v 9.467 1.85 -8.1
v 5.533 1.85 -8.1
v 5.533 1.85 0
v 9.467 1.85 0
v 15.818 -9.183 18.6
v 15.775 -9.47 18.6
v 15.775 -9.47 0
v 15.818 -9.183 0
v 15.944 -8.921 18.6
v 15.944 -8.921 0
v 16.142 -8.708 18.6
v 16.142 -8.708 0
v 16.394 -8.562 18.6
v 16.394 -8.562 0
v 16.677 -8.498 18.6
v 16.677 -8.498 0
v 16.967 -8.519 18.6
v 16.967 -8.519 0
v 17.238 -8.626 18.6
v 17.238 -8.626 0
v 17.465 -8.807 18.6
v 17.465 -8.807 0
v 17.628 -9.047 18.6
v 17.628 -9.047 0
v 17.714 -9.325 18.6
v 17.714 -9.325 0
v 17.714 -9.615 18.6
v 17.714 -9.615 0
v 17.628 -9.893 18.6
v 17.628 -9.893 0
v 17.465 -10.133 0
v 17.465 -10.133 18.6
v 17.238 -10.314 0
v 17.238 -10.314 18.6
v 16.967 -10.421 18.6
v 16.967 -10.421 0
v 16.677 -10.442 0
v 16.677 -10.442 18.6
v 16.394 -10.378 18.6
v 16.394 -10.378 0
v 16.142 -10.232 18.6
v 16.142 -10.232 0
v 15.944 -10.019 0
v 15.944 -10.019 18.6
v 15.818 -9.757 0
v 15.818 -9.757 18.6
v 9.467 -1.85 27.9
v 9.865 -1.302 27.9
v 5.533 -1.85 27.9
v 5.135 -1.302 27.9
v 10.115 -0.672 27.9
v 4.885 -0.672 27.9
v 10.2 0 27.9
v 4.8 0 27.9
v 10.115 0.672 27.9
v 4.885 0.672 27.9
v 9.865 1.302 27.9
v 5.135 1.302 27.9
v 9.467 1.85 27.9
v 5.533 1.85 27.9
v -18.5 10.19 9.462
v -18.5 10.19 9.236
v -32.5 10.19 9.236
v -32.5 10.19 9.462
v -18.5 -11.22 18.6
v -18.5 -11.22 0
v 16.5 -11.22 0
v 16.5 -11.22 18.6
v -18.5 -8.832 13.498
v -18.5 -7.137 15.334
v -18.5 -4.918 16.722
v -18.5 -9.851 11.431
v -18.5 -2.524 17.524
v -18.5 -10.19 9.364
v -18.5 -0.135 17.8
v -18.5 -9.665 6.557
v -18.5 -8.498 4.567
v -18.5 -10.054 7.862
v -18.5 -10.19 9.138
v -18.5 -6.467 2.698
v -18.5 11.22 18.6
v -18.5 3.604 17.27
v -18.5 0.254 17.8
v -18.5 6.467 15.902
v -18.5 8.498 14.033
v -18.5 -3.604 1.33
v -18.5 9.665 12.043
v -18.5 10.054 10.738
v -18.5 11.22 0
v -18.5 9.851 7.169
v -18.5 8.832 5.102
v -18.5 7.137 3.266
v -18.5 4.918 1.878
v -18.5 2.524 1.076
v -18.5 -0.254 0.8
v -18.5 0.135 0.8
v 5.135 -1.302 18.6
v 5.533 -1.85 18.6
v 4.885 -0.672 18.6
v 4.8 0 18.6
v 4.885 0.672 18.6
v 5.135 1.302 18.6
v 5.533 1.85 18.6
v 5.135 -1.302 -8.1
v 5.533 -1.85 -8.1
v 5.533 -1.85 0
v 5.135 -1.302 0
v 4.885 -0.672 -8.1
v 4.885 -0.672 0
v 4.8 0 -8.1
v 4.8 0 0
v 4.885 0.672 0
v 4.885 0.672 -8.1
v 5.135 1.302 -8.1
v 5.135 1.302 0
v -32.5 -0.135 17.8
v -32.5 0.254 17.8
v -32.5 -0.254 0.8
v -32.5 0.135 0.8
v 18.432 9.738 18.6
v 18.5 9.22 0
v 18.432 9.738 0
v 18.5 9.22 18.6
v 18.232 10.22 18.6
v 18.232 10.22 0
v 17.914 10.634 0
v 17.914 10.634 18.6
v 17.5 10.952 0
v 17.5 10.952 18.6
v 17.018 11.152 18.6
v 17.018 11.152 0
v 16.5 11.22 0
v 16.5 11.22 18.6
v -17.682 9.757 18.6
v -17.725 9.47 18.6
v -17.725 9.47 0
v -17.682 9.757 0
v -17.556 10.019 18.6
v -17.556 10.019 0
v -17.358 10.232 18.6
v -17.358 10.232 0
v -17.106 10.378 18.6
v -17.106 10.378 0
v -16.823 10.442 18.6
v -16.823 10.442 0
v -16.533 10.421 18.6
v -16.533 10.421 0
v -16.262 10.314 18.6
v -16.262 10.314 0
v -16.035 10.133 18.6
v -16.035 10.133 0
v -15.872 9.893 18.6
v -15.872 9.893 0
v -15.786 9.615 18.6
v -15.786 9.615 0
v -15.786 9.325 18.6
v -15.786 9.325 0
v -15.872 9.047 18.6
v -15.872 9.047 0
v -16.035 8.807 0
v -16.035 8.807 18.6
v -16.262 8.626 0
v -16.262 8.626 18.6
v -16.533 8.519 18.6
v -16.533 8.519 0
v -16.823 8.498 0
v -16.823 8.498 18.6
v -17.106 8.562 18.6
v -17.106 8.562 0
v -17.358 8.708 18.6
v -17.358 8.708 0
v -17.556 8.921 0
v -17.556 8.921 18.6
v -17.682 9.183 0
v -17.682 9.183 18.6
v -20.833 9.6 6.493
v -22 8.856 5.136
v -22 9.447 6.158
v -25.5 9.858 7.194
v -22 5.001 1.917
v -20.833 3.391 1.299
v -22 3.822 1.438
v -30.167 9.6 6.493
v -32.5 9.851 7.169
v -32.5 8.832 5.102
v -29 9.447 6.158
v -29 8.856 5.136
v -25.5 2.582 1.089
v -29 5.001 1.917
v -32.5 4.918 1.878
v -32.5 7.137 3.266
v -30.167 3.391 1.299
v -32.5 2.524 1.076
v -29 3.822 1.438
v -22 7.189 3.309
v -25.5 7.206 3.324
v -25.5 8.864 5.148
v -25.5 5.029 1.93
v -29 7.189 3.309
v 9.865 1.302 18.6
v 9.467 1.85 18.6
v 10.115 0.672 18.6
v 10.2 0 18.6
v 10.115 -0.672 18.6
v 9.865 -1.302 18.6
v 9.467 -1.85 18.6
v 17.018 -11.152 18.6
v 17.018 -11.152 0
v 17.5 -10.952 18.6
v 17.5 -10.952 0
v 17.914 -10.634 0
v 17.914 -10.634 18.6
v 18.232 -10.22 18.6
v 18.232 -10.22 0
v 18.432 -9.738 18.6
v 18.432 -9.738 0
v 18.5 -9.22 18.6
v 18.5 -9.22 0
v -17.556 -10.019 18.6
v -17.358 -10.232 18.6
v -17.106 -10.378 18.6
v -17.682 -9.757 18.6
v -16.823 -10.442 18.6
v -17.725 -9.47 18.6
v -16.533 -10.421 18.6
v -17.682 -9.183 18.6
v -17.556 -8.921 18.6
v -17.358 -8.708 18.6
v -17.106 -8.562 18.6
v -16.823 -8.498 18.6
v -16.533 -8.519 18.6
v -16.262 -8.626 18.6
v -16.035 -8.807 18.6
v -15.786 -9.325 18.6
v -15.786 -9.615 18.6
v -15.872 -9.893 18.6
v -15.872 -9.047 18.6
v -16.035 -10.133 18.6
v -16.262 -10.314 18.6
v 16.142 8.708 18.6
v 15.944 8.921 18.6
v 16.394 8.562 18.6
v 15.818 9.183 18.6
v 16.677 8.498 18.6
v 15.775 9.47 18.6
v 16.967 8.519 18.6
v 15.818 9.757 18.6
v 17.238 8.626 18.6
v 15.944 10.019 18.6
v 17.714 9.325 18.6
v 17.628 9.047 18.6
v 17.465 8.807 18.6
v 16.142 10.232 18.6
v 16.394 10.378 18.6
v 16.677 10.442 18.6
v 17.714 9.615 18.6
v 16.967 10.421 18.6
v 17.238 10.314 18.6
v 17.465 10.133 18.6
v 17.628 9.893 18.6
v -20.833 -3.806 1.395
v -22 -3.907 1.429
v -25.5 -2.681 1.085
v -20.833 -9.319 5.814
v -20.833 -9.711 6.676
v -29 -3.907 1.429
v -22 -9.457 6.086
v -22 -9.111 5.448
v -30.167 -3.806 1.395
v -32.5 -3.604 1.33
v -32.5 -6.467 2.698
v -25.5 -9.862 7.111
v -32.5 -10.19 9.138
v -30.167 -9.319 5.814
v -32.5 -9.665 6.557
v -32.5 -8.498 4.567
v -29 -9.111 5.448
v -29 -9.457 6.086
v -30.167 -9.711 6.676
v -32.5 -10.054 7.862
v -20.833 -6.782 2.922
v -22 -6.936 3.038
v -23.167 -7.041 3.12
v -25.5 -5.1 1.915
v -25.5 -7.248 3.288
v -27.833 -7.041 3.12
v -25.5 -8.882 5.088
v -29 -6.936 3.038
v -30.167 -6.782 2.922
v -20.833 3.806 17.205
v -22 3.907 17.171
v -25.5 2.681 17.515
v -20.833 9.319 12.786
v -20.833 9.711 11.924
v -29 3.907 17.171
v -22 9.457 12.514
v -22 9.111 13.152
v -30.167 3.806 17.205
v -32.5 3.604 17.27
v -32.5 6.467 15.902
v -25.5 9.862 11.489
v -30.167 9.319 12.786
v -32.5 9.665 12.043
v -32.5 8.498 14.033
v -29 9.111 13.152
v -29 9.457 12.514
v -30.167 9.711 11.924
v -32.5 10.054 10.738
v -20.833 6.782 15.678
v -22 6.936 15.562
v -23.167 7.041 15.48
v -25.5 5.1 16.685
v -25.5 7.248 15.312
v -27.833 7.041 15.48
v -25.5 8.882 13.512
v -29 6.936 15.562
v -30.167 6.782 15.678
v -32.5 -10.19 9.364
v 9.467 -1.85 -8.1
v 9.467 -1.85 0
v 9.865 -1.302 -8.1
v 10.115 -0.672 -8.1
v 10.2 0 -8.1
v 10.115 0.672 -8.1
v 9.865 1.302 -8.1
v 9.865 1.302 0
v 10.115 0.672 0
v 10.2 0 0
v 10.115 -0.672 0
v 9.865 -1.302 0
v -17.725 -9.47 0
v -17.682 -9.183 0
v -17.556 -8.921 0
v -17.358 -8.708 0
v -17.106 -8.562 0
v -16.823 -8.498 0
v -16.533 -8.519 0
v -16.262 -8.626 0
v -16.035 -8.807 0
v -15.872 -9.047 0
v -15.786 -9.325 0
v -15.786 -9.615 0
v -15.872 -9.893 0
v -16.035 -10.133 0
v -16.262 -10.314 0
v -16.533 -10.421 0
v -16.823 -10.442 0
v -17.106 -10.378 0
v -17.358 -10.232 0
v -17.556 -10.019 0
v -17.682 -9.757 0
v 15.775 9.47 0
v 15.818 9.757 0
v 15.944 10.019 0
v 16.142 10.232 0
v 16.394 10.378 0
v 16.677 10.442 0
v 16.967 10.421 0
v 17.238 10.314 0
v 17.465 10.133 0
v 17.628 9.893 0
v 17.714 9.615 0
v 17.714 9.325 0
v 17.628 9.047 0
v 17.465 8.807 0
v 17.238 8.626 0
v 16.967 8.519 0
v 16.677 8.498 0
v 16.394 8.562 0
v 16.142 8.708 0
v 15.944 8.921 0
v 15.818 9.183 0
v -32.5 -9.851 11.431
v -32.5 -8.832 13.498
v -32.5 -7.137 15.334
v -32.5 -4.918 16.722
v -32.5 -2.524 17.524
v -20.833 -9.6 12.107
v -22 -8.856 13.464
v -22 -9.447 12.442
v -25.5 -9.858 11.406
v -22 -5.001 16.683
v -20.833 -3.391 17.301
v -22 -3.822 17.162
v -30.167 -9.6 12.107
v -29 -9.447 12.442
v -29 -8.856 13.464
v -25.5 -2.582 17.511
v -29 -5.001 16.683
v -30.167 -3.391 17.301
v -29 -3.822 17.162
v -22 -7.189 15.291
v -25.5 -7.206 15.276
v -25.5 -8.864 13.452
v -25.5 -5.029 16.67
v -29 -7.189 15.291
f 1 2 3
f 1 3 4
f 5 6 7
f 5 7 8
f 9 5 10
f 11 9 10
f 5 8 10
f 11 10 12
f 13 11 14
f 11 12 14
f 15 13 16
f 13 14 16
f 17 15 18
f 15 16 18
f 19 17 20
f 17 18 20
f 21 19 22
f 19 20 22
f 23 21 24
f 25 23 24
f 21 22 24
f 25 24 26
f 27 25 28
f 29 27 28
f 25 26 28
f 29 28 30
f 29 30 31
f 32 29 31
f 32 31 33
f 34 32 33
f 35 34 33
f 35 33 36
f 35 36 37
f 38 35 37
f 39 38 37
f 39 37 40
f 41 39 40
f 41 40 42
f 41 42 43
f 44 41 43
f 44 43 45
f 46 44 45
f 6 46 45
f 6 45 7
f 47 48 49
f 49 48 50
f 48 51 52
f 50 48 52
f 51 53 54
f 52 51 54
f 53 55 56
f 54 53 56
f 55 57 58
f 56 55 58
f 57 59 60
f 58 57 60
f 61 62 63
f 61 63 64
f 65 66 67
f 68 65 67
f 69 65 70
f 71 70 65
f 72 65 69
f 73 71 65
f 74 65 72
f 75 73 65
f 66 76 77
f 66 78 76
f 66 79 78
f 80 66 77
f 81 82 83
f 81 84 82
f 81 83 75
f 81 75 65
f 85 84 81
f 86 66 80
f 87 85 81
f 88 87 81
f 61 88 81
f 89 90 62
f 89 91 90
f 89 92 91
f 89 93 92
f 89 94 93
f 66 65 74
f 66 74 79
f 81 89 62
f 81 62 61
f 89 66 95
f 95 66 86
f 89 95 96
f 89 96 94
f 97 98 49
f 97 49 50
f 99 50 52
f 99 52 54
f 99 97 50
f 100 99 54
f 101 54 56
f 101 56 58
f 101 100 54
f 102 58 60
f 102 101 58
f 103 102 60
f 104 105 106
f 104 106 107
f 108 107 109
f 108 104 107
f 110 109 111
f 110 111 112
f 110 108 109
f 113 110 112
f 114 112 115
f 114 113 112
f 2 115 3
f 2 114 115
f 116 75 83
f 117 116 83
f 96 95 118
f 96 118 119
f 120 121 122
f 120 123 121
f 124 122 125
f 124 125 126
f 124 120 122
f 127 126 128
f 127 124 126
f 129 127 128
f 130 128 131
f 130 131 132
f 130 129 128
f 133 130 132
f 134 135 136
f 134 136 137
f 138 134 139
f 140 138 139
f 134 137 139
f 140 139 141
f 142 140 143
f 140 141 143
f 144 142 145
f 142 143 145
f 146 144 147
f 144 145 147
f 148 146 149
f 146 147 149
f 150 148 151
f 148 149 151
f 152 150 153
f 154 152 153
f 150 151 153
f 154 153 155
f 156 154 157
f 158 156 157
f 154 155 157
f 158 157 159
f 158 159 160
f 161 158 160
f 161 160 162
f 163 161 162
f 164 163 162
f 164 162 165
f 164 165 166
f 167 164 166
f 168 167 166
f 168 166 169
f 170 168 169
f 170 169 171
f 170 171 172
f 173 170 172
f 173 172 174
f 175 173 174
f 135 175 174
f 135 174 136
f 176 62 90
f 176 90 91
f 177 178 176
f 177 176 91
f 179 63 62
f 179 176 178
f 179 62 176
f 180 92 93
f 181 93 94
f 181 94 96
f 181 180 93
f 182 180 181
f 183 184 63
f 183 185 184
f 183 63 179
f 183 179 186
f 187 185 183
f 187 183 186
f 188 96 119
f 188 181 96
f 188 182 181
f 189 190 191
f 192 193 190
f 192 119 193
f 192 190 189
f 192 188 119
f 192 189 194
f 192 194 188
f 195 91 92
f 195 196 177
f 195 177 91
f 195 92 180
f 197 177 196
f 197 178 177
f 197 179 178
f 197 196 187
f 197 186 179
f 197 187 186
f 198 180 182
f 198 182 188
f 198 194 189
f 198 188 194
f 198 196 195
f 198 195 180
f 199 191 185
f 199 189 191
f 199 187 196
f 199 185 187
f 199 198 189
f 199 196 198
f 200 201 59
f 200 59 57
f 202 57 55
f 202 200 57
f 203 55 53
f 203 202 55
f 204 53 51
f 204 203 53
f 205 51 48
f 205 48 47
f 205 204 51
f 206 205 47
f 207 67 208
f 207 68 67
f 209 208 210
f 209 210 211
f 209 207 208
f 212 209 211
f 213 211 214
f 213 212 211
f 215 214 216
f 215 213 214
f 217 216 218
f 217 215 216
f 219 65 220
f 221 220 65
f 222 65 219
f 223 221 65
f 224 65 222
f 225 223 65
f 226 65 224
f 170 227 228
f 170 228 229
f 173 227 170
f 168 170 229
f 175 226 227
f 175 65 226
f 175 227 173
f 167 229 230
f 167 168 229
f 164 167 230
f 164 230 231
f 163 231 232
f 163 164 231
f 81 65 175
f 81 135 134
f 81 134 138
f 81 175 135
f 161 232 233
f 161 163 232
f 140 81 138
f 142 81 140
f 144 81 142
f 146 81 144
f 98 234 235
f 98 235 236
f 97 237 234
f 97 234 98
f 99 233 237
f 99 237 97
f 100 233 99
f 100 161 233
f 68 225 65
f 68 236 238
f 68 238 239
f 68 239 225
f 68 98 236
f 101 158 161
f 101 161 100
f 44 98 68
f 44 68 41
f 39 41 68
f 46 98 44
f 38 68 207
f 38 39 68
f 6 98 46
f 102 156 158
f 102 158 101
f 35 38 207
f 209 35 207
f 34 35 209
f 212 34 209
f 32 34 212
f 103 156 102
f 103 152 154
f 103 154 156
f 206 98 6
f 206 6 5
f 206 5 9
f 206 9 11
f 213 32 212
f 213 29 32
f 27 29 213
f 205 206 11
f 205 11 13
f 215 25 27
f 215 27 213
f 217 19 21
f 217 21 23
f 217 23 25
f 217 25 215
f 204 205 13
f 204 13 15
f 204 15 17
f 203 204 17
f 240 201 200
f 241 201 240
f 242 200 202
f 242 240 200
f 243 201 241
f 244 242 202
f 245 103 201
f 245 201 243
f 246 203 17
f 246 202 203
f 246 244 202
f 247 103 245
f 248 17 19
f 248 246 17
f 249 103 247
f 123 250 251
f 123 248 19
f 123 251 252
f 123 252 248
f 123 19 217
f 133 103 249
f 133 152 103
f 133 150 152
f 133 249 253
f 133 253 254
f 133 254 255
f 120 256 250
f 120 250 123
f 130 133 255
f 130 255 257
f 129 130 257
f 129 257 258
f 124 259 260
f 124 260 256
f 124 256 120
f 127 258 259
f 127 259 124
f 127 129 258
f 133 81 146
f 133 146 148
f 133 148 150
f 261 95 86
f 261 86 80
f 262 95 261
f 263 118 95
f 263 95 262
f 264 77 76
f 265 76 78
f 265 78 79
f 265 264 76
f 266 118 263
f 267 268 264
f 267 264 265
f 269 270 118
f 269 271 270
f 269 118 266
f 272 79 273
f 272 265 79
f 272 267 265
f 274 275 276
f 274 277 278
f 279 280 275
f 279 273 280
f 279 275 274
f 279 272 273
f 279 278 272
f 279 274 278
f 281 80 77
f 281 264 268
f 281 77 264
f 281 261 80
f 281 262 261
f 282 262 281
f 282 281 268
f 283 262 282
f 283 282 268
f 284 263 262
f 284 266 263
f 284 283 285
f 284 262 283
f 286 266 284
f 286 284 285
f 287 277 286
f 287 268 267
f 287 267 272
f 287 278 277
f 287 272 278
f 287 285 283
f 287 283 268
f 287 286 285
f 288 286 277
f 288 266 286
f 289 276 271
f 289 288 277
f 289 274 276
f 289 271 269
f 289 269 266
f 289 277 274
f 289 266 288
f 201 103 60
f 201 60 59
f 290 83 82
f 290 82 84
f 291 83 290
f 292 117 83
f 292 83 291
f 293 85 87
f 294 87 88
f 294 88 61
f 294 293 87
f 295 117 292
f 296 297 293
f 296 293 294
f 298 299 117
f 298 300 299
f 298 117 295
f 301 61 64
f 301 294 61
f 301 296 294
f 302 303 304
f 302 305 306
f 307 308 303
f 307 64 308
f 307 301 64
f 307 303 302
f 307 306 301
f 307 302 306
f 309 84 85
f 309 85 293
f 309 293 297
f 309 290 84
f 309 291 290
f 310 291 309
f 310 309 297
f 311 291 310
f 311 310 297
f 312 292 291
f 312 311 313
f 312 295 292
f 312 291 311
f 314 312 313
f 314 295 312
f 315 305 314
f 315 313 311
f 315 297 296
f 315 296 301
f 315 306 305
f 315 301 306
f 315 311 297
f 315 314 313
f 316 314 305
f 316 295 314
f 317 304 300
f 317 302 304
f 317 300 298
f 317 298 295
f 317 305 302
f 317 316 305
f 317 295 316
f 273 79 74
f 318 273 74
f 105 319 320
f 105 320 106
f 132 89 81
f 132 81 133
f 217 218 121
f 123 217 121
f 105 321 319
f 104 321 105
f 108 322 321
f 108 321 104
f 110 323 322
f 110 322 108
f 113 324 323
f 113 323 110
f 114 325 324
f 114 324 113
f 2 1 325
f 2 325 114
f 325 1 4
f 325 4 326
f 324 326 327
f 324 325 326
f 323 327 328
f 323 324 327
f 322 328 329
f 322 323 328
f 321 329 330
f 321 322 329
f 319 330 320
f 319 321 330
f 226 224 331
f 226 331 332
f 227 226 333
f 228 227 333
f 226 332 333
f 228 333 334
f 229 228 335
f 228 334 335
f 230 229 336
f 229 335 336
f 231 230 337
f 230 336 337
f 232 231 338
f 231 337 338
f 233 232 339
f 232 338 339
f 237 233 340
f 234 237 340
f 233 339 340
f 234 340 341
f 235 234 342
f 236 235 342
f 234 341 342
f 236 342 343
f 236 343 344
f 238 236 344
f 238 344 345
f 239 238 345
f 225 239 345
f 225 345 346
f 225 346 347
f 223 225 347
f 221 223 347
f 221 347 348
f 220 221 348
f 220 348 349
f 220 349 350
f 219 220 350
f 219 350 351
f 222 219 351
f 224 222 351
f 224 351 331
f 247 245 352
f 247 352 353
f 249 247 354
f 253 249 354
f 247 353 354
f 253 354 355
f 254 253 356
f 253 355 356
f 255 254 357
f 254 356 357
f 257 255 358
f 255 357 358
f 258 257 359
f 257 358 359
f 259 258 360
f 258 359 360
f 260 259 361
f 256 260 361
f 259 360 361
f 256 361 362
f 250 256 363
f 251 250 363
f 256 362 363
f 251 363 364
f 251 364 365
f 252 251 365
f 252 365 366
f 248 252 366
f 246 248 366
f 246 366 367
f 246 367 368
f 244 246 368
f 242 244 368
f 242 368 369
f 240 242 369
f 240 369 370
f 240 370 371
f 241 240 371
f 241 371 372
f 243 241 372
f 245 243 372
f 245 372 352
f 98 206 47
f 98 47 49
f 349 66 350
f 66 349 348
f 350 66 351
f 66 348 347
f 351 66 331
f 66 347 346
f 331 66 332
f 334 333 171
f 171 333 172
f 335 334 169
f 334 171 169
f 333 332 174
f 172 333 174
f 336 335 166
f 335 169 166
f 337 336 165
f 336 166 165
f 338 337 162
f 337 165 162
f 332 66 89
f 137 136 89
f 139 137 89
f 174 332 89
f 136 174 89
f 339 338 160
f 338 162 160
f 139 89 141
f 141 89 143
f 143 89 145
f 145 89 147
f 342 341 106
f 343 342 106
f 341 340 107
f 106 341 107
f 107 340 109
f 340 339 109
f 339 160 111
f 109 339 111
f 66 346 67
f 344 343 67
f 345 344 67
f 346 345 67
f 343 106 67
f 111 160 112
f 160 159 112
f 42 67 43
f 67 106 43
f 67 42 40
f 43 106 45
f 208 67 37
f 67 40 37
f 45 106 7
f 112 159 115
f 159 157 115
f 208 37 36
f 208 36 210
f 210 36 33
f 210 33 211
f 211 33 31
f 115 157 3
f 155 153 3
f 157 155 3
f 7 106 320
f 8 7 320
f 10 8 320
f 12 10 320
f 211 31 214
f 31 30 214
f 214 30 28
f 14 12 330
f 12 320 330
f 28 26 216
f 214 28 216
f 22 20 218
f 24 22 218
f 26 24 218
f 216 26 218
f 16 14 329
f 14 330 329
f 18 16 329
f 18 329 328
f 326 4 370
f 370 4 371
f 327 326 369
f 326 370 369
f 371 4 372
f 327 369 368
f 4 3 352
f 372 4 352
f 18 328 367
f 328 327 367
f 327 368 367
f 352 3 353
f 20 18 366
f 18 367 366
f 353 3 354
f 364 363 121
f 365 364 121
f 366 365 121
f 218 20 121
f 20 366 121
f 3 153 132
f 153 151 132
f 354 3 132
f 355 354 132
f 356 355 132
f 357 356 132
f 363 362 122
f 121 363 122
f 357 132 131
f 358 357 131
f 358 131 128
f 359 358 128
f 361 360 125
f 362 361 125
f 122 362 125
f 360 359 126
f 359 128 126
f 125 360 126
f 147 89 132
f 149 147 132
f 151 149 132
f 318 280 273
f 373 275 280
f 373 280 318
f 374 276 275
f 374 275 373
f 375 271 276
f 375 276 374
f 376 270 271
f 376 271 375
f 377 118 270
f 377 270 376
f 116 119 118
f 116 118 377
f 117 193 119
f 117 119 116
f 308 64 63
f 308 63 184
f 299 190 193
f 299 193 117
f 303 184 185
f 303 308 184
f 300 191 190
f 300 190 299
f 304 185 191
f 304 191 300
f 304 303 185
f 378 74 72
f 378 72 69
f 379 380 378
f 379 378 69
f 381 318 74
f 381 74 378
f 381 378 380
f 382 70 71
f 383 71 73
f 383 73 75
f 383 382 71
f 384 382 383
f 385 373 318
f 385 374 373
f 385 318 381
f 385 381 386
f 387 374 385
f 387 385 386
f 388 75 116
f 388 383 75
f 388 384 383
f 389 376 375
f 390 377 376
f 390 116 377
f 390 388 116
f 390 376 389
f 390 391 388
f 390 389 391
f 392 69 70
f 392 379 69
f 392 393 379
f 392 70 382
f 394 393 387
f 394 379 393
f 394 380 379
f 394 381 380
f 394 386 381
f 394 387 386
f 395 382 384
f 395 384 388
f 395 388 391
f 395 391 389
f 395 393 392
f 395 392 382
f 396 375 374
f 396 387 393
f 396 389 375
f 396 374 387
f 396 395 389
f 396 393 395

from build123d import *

# Parameters (mm, degrees)
SKETCH1_W                = 37
SKETCH1_H                = 22.44
BOSS_EXTRUDE1_DEPTH      = 18.6
FILLET1_R                = 2
SKETCH2_W                = 17
SKETCH2_H                = 20.38
BOSS_EXTRUDE2_DEPTH      = 14
BOSS_EXTRUDE3_DEPTH      = 9.3
BOSS_EXTRUDE3_DEPTH_BACK = 26.7
CUT_EXTRUDE1_DEPTH       = 14
SKETCH5_R                = 0.975
CUT_EXTRUDE2_DEPTH       = 45.278080455


with BuildPart() as part:
    # Sketch1 → Boss-Extrude1 (new body)
    with BuildSketch(Plane.XY):
        Rectangle(SKETCH1_W, SKETCH1_H)
    extrude(amount=BOSS_EXTRUDE1_DEPTH)

    # Fillet1
    fillet1_edges = [part.edges().sort_by_distance(p)[0] for p in [
        (18.5, 11.22, 9.3),
        (18.5, -11.22, 9.3),
    ]]
    fillet(fillet1_edges, radius=FILLET1_R)

    # Sketch2 → Boss-Extrude2 (add)
    with BuildSketch(Plane.ZY.offset(18.5)):
        with Locations((9.3, 0)):
            Rectangle(SKETCH2_W, SKETCH2_H)
    extrude(amount=BOSS_EXTRUDE2_DEPTH)

    # Sketch3 → Boss-Extrude3 (add, two sides: drawn at the far end of the back side and taken through both)
    with BuildSketch(Plane.XY.offset(18.6).offset(-BOSS_EXTRUDE3_DEPTH_BACK)):
        with BuildLine():
            Line((5.533403956, 1.85), (9.466596044, 1.85))
            ThreePointArc((9.466596044, 1.85), (10.2, 0), (9.466596044, -1.85))
            Line((9.466596044, -1.85), (5.533403956, -1.85))
            ThreePointArc((5.533403956, -1.85), (4.8, 0), (5.533403956, 1.85))
        make_face()
    extrude(amount=BOSS_EXTRUDE3_DEPTH + BOSS_EXTRUDE3_DEPTH_BACK)

    # Sketch4 → Cut-Extrude1 (cut)
    with BuildSketch(Plane.ZY.offset(32.5)):
        with BuildLine():
            Line((0.8, 10.19), (0.8, 0.135437192))
            add(Edge.make_bspline(
                [(9.236397672, 10.19), (0.95810585, 10.058115826), (0.8, 0.135437192)],
                knots=[0.026580808, 0.026580808, 0.026580808, 1.570796327, 1.570796327, 1.570796327], degree=2, weights=[1, 0.71644179, 1]))
            Line((9.236397672, 10.19), (0.8, 10.19))
        make_face()
        with BuildLine():
            Line((17.8, 10.19), (9.462365292, 10.19))
            add(Edge.make_bspline(
                [(17.8, 0.25381428), (17.64372138, 10.059640013), (9.462365292, 10.19)],
                knots=[4.750587933, 4.750587933, 4.750587933, 6.283185307, 6.283185307, 6.283185307], degree=2, weights=[1, 0.72048236, 1]))
            Line((17.8, 0.25381428), (17.8, 10.19))
        make_face()
        with BuildLine():
            add(Edge.make_bspline(
                [(9.363602328, -10.19), (17.64189415, -10.058115826), (17.8, -0.135437192)],
                knots=[3.168173462, 3.168173462, 3.168173462, 4.71238898, 4.71238898, 4.71238898], degree=2, weights=[1, 0.71644179, 1]))
            Line((9.363602328, -10.19), (17.8, -10.19))
            Line((17.8, -10.19), (17.8, -0.135437192))
        make_face()
        with BuildLine():
            add(Edge.make_bspline(
                [(0.8, -0.25381428), (0.95627862, -10.059640013), (9.137634708, -10.19)],
                knots=[1.608995279, 1.608995279, 1.608995279, 3.141592654, 3.141592654, 3.141592654], degree=2, weights=[1, 0.72048236, 1]))
            Line((0.8, -0.25381428), (0.8, -10.19))
            Line((0.8, -10.19), (9.137634708, -10.19))
        make_face()
    extrude(amount=-CUT_EXTRUDE1_DEPTH, mode=Mode.SUBTRACT)

    # Sketch5 → Cut-Extrude2 (cut, through all)
    with BuildSketch(Plane(origin=(0, 0, 0), x_dir=(-1, 0, 0), z_dir=(0, 0, -1))):
        with Locations((-16.75, 9.47)):
            Circle(SKETCH5_R)
        with Locations((-16.75, -9.47)):
            Circle(SKETCH5_R)
        with Locations((16.75, -9.47)):
            Circle(SKETCH5_R)
        with Locations((16.75, 9.47)):
            Circle(SKETCH5_R)
    extrude(amount=-CUT_EXTRUDE2_DEPTH, mode=Mode.SUBTRACT)


solid = part.part
